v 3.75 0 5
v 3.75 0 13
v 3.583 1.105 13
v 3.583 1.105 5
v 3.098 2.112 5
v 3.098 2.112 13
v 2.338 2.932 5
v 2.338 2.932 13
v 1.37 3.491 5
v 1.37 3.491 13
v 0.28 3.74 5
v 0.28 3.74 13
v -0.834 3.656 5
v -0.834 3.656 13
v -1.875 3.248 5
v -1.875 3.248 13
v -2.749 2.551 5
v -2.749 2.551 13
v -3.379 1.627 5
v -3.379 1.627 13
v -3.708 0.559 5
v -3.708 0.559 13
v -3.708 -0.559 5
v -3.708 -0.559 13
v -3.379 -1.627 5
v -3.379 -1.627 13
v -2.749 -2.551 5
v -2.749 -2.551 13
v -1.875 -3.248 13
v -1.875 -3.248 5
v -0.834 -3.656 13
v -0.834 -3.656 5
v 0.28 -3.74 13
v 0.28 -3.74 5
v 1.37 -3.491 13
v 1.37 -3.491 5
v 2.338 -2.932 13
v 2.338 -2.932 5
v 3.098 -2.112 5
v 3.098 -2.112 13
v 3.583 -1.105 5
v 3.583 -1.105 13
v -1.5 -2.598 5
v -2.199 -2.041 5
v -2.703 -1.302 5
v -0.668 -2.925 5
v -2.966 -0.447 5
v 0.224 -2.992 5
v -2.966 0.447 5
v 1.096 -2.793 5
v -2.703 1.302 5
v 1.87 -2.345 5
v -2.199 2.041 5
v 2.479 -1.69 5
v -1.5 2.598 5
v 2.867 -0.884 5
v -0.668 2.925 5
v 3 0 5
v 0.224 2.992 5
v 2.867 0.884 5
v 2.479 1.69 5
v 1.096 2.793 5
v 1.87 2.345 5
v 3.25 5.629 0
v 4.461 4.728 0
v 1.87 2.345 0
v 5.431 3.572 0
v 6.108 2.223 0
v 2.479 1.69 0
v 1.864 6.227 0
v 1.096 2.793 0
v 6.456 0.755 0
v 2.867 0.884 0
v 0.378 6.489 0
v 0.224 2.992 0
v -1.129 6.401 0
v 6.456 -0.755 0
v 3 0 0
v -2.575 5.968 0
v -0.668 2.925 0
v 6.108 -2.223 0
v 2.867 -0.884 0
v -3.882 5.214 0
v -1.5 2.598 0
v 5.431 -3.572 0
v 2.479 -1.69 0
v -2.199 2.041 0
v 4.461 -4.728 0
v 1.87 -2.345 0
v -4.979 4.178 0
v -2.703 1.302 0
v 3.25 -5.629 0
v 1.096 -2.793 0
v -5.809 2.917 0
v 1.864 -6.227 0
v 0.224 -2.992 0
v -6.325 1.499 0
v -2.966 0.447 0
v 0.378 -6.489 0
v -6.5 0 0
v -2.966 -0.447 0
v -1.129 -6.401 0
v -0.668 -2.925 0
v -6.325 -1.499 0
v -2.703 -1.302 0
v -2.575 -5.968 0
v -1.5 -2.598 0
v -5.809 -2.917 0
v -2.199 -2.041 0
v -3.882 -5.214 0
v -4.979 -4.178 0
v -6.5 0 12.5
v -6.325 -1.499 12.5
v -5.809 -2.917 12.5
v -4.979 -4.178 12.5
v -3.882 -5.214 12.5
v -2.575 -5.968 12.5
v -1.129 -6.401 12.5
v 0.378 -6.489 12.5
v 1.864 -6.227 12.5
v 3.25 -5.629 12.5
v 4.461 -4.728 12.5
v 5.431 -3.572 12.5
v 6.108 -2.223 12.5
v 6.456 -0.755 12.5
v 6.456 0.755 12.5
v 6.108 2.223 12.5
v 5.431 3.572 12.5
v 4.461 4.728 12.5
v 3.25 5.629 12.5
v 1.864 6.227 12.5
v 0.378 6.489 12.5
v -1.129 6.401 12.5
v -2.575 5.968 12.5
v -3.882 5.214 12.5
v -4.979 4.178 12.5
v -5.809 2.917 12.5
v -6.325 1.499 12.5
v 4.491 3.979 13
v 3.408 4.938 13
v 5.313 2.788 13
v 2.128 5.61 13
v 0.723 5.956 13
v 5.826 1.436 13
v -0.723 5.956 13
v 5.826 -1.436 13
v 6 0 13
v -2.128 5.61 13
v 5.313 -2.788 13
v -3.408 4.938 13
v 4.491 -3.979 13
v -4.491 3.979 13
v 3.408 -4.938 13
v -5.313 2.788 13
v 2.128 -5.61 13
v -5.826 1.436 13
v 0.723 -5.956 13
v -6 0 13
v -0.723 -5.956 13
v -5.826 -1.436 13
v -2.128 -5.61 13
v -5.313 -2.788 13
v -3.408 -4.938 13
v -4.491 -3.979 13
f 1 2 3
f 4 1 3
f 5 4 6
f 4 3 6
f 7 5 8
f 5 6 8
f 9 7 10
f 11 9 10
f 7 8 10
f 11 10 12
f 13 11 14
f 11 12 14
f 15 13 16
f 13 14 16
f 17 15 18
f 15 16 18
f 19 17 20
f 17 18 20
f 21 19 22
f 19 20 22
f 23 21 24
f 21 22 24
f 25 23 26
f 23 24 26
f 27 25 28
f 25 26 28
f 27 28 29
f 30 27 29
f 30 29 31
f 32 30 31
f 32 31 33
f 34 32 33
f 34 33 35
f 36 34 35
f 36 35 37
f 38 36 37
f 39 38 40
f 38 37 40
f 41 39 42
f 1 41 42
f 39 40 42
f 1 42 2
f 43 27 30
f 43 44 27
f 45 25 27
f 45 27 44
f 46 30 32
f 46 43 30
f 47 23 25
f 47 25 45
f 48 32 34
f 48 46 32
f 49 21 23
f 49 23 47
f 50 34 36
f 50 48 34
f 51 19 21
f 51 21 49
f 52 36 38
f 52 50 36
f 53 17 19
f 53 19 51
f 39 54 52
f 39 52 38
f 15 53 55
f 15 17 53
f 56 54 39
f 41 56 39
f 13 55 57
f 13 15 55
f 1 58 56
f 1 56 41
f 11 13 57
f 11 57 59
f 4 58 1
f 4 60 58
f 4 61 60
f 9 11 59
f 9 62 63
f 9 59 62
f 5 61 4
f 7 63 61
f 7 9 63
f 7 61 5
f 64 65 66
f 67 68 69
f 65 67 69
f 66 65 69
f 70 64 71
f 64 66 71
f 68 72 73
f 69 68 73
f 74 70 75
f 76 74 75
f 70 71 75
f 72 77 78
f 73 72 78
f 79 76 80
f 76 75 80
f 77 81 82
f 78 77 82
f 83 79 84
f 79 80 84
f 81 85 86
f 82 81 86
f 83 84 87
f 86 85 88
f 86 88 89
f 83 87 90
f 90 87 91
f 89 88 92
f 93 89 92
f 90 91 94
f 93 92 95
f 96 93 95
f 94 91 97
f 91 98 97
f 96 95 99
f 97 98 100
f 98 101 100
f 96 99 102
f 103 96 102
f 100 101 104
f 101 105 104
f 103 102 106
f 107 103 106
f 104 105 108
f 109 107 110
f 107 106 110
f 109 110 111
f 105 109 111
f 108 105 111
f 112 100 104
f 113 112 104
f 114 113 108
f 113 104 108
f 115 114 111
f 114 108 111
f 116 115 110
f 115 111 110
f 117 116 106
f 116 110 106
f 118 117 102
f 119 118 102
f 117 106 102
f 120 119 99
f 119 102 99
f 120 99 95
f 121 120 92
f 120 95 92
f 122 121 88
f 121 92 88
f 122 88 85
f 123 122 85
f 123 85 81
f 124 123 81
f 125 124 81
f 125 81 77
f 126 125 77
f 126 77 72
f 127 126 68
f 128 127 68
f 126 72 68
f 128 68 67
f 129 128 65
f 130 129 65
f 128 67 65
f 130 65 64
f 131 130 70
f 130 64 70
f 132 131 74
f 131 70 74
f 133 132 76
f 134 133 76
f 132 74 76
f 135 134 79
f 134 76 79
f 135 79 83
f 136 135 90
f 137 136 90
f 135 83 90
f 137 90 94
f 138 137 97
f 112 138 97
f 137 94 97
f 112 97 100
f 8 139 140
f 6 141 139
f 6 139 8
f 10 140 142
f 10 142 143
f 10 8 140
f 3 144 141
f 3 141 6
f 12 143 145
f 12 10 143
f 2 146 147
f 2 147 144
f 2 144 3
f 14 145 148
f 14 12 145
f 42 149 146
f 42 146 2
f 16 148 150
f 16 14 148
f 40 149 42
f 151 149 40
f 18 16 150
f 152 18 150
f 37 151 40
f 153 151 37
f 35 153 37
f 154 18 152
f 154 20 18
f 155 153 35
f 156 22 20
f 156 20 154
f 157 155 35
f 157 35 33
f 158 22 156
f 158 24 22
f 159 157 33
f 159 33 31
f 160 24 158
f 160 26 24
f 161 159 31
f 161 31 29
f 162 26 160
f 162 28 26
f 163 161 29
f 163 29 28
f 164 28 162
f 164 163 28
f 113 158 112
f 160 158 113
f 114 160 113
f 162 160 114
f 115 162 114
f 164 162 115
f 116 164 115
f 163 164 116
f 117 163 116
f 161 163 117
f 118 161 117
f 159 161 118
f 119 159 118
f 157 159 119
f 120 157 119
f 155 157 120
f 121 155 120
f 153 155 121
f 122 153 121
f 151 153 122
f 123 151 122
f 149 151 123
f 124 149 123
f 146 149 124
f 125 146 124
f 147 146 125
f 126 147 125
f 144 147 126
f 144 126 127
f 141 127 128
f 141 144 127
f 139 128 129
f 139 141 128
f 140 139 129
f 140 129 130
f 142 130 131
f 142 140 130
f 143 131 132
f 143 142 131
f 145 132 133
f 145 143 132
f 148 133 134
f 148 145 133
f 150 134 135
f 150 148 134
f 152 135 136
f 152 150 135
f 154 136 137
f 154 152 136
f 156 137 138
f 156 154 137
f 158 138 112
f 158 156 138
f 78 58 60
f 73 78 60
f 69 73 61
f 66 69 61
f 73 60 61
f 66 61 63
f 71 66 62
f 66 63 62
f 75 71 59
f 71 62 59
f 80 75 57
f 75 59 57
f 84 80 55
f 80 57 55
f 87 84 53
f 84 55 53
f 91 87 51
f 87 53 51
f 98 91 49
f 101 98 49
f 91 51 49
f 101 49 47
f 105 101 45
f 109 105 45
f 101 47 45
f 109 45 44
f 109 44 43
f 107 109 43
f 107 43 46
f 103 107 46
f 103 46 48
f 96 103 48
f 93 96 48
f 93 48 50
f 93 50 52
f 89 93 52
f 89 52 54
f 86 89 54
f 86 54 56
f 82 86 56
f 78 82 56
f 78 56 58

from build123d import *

# Parameters (mm, degrees)
SKETCH_1_R          = 6.5
EXTRUDE_192_DEPTH   = 13
SKETCH_2_R          = 3
CUT_EXTRUDE_1_DEPTH = 16.921683328
SKETCH_3_R          = 3.75
CUT_EXTRUDE_2_DEPTH = 8
CHAMFER_1_SIZE      = 0.5


with BuildPart() as part:
    # Эскиз1 → Extrude 192 (new body)
    with BuildSketch(Plane.XY):
        with Locations(Location((0, 0, 0), (0, 0, 180))):
            Circle(SKETCH_1_R)
    extrude(amount=EXTRUDE_192_DEPTH)

    # Эскиз2 → Вырез-Вытянуть1 (cut, through all)
    with BuildSketch(Plane.XY.offset(13)):
        Circle(SKETCH_2_R)
    extrude(amount=-CUT_EXTRUDE_1_DEPTH, mode=Mode.SUBTRACT)

    # Эскиз3 → Вырез-Вытянуть2 (cut)
    with BuildSketch(Plane.XY.offset(13)):
        Circle(SKETCH_3_R)
    extrude(amount=-CUT_EXTRUDE_2_DEPTH, mode=Mode.SUBTRACT)

    # Фаска1
    chamfer_1_edges = [part.edges().sort_by_distance(p)[0] for p in [
        (6.5, 0, 13),
    ]]
    chamfer(chamfer_1_edges, length=CHAMFER_1_SIZE)


solid = part.part
